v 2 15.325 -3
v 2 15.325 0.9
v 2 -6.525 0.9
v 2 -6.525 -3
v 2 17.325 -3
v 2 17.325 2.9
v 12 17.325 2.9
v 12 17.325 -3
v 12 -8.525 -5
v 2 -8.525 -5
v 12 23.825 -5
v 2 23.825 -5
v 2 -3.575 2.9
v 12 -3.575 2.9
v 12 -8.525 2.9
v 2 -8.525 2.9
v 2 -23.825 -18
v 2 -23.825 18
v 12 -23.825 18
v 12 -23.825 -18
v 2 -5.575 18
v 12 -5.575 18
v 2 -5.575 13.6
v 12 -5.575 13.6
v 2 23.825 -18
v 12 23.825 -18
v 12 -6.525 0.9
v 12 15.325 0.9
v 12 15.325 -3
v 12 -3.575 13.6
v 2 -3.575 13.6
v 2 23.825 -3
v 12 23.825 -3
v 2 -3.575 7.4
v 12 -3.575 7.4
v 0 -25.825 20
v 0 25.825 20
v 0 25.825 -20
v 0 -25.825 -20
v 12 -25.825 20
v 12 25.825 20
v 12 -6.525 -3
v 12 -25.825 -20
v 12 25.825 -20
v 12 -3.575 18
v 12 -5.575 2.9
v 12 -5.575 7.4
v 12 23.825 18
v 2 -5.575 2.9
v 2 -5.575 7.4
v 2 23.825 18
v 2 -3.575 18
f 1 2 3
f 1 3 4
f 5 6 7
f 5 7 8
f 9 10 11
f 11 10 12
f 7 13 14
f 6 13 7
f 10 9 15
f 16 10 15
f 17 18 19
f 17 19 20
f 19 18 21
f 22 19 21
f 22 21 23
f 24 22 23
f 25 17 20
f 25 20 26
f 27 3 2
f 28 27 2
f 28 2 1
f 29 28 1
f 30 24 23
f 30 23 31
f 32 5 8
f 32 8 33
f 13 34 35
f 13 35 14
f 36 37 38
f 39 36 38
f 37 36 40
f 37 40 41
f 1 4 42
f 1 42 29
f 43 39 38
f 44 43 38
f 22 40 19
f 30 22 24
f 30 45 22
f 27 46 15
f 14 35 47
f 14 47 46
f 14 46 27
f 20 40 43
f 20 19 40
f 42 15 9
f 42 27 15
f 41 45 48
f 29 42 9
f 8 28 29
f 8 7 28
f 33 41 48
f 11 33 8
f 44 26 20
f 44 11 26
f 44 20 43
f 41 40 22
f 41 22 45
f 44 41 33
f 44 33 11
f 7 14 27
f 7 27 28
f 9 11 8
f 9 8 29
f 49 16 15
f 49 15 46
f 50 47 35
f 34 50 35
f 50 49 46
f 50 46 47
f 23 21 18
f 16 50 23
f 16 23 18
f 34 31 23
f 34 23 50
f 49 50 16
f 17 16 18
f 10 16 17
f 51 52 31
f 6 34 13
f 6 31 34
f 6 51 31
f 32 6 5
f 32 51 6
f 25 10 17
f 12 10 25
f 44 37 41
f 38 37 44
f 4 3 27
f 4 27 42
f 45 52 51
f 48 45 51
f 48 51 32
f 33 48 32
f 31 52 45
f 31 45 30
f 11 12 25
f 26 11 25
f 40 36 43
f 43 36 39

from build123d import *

# Parameters (mm, degrees)
SKETCH_1_W      = 40
SKETCH_1_H      = 51.65
EXTRUDE_1_DEPTH = 12
SHELL_1_T       = -2
SKETCH_3_W      = 3.9
SKETCH_3_H      = 21.85
SKETCH_3_W_2    = 4.4
SKETCH_3_H_2    = 2
EXTRUDE_6_DEPTH = 10


with BuildPart() as part:
    # 草图1 → 凸台-拉伸1 (new body)
    with BuildSketch(Plane(origin=(0, 0, 0), x_dir=(0, 0, -1), z_dir=(1, 0, 0))):
        Rectangle(SKETCH_1_W, SKETCH_1_H)
    extrude(amount=EXTRUDE_1_DEPTH)

    # 抽壳1
    shell_1_openings = [part.faces().sort_by_distance(p)[0] for p in [
        (12, 0, 0),
    ]]
    offset(amount=SHELL_1_T, openings=shell_1_openings, kind=Kind.INTERSECTION)

    # 草图3 → 凸台-拉伸6 (add)
    # profile 1 of 2: a face of its own
    with BuildSketch(Plane(origin=(2, 0, 0), x_dir=(0, 0, -1), z_dir=(1, 0, 0))):
        Polygon((-2.9, 17.325), (3, 17.325), (3, 23.825), (5, 23.825), (5, 17.175), (5, -8.525), (-2.9, -8.525), (-2.9, -5.575), (-7.4, -5.575), (-7.4, -3.575), (-2.9, -3.575), align=None)
        with Locations((1.05, 4.4)):
            Rectangle(SKETCH_3_W, SKETCH_3_H, mode=Mode.SUBTRACT)
    # profile 2 of 2: a face of its own
    with BuildSketch(Plane(origin=(2, 0, 0), x_dir=(0, 0, -1), z_dir=(1, 0, 0))):
        with Locations((-15.8, -4.575)):
            Rectangle(SKETCH_3_W_2, SKETCH_3_H_2)
    extrude(amount=EXTRUDE_6_DEPTH)


solid = part.part
